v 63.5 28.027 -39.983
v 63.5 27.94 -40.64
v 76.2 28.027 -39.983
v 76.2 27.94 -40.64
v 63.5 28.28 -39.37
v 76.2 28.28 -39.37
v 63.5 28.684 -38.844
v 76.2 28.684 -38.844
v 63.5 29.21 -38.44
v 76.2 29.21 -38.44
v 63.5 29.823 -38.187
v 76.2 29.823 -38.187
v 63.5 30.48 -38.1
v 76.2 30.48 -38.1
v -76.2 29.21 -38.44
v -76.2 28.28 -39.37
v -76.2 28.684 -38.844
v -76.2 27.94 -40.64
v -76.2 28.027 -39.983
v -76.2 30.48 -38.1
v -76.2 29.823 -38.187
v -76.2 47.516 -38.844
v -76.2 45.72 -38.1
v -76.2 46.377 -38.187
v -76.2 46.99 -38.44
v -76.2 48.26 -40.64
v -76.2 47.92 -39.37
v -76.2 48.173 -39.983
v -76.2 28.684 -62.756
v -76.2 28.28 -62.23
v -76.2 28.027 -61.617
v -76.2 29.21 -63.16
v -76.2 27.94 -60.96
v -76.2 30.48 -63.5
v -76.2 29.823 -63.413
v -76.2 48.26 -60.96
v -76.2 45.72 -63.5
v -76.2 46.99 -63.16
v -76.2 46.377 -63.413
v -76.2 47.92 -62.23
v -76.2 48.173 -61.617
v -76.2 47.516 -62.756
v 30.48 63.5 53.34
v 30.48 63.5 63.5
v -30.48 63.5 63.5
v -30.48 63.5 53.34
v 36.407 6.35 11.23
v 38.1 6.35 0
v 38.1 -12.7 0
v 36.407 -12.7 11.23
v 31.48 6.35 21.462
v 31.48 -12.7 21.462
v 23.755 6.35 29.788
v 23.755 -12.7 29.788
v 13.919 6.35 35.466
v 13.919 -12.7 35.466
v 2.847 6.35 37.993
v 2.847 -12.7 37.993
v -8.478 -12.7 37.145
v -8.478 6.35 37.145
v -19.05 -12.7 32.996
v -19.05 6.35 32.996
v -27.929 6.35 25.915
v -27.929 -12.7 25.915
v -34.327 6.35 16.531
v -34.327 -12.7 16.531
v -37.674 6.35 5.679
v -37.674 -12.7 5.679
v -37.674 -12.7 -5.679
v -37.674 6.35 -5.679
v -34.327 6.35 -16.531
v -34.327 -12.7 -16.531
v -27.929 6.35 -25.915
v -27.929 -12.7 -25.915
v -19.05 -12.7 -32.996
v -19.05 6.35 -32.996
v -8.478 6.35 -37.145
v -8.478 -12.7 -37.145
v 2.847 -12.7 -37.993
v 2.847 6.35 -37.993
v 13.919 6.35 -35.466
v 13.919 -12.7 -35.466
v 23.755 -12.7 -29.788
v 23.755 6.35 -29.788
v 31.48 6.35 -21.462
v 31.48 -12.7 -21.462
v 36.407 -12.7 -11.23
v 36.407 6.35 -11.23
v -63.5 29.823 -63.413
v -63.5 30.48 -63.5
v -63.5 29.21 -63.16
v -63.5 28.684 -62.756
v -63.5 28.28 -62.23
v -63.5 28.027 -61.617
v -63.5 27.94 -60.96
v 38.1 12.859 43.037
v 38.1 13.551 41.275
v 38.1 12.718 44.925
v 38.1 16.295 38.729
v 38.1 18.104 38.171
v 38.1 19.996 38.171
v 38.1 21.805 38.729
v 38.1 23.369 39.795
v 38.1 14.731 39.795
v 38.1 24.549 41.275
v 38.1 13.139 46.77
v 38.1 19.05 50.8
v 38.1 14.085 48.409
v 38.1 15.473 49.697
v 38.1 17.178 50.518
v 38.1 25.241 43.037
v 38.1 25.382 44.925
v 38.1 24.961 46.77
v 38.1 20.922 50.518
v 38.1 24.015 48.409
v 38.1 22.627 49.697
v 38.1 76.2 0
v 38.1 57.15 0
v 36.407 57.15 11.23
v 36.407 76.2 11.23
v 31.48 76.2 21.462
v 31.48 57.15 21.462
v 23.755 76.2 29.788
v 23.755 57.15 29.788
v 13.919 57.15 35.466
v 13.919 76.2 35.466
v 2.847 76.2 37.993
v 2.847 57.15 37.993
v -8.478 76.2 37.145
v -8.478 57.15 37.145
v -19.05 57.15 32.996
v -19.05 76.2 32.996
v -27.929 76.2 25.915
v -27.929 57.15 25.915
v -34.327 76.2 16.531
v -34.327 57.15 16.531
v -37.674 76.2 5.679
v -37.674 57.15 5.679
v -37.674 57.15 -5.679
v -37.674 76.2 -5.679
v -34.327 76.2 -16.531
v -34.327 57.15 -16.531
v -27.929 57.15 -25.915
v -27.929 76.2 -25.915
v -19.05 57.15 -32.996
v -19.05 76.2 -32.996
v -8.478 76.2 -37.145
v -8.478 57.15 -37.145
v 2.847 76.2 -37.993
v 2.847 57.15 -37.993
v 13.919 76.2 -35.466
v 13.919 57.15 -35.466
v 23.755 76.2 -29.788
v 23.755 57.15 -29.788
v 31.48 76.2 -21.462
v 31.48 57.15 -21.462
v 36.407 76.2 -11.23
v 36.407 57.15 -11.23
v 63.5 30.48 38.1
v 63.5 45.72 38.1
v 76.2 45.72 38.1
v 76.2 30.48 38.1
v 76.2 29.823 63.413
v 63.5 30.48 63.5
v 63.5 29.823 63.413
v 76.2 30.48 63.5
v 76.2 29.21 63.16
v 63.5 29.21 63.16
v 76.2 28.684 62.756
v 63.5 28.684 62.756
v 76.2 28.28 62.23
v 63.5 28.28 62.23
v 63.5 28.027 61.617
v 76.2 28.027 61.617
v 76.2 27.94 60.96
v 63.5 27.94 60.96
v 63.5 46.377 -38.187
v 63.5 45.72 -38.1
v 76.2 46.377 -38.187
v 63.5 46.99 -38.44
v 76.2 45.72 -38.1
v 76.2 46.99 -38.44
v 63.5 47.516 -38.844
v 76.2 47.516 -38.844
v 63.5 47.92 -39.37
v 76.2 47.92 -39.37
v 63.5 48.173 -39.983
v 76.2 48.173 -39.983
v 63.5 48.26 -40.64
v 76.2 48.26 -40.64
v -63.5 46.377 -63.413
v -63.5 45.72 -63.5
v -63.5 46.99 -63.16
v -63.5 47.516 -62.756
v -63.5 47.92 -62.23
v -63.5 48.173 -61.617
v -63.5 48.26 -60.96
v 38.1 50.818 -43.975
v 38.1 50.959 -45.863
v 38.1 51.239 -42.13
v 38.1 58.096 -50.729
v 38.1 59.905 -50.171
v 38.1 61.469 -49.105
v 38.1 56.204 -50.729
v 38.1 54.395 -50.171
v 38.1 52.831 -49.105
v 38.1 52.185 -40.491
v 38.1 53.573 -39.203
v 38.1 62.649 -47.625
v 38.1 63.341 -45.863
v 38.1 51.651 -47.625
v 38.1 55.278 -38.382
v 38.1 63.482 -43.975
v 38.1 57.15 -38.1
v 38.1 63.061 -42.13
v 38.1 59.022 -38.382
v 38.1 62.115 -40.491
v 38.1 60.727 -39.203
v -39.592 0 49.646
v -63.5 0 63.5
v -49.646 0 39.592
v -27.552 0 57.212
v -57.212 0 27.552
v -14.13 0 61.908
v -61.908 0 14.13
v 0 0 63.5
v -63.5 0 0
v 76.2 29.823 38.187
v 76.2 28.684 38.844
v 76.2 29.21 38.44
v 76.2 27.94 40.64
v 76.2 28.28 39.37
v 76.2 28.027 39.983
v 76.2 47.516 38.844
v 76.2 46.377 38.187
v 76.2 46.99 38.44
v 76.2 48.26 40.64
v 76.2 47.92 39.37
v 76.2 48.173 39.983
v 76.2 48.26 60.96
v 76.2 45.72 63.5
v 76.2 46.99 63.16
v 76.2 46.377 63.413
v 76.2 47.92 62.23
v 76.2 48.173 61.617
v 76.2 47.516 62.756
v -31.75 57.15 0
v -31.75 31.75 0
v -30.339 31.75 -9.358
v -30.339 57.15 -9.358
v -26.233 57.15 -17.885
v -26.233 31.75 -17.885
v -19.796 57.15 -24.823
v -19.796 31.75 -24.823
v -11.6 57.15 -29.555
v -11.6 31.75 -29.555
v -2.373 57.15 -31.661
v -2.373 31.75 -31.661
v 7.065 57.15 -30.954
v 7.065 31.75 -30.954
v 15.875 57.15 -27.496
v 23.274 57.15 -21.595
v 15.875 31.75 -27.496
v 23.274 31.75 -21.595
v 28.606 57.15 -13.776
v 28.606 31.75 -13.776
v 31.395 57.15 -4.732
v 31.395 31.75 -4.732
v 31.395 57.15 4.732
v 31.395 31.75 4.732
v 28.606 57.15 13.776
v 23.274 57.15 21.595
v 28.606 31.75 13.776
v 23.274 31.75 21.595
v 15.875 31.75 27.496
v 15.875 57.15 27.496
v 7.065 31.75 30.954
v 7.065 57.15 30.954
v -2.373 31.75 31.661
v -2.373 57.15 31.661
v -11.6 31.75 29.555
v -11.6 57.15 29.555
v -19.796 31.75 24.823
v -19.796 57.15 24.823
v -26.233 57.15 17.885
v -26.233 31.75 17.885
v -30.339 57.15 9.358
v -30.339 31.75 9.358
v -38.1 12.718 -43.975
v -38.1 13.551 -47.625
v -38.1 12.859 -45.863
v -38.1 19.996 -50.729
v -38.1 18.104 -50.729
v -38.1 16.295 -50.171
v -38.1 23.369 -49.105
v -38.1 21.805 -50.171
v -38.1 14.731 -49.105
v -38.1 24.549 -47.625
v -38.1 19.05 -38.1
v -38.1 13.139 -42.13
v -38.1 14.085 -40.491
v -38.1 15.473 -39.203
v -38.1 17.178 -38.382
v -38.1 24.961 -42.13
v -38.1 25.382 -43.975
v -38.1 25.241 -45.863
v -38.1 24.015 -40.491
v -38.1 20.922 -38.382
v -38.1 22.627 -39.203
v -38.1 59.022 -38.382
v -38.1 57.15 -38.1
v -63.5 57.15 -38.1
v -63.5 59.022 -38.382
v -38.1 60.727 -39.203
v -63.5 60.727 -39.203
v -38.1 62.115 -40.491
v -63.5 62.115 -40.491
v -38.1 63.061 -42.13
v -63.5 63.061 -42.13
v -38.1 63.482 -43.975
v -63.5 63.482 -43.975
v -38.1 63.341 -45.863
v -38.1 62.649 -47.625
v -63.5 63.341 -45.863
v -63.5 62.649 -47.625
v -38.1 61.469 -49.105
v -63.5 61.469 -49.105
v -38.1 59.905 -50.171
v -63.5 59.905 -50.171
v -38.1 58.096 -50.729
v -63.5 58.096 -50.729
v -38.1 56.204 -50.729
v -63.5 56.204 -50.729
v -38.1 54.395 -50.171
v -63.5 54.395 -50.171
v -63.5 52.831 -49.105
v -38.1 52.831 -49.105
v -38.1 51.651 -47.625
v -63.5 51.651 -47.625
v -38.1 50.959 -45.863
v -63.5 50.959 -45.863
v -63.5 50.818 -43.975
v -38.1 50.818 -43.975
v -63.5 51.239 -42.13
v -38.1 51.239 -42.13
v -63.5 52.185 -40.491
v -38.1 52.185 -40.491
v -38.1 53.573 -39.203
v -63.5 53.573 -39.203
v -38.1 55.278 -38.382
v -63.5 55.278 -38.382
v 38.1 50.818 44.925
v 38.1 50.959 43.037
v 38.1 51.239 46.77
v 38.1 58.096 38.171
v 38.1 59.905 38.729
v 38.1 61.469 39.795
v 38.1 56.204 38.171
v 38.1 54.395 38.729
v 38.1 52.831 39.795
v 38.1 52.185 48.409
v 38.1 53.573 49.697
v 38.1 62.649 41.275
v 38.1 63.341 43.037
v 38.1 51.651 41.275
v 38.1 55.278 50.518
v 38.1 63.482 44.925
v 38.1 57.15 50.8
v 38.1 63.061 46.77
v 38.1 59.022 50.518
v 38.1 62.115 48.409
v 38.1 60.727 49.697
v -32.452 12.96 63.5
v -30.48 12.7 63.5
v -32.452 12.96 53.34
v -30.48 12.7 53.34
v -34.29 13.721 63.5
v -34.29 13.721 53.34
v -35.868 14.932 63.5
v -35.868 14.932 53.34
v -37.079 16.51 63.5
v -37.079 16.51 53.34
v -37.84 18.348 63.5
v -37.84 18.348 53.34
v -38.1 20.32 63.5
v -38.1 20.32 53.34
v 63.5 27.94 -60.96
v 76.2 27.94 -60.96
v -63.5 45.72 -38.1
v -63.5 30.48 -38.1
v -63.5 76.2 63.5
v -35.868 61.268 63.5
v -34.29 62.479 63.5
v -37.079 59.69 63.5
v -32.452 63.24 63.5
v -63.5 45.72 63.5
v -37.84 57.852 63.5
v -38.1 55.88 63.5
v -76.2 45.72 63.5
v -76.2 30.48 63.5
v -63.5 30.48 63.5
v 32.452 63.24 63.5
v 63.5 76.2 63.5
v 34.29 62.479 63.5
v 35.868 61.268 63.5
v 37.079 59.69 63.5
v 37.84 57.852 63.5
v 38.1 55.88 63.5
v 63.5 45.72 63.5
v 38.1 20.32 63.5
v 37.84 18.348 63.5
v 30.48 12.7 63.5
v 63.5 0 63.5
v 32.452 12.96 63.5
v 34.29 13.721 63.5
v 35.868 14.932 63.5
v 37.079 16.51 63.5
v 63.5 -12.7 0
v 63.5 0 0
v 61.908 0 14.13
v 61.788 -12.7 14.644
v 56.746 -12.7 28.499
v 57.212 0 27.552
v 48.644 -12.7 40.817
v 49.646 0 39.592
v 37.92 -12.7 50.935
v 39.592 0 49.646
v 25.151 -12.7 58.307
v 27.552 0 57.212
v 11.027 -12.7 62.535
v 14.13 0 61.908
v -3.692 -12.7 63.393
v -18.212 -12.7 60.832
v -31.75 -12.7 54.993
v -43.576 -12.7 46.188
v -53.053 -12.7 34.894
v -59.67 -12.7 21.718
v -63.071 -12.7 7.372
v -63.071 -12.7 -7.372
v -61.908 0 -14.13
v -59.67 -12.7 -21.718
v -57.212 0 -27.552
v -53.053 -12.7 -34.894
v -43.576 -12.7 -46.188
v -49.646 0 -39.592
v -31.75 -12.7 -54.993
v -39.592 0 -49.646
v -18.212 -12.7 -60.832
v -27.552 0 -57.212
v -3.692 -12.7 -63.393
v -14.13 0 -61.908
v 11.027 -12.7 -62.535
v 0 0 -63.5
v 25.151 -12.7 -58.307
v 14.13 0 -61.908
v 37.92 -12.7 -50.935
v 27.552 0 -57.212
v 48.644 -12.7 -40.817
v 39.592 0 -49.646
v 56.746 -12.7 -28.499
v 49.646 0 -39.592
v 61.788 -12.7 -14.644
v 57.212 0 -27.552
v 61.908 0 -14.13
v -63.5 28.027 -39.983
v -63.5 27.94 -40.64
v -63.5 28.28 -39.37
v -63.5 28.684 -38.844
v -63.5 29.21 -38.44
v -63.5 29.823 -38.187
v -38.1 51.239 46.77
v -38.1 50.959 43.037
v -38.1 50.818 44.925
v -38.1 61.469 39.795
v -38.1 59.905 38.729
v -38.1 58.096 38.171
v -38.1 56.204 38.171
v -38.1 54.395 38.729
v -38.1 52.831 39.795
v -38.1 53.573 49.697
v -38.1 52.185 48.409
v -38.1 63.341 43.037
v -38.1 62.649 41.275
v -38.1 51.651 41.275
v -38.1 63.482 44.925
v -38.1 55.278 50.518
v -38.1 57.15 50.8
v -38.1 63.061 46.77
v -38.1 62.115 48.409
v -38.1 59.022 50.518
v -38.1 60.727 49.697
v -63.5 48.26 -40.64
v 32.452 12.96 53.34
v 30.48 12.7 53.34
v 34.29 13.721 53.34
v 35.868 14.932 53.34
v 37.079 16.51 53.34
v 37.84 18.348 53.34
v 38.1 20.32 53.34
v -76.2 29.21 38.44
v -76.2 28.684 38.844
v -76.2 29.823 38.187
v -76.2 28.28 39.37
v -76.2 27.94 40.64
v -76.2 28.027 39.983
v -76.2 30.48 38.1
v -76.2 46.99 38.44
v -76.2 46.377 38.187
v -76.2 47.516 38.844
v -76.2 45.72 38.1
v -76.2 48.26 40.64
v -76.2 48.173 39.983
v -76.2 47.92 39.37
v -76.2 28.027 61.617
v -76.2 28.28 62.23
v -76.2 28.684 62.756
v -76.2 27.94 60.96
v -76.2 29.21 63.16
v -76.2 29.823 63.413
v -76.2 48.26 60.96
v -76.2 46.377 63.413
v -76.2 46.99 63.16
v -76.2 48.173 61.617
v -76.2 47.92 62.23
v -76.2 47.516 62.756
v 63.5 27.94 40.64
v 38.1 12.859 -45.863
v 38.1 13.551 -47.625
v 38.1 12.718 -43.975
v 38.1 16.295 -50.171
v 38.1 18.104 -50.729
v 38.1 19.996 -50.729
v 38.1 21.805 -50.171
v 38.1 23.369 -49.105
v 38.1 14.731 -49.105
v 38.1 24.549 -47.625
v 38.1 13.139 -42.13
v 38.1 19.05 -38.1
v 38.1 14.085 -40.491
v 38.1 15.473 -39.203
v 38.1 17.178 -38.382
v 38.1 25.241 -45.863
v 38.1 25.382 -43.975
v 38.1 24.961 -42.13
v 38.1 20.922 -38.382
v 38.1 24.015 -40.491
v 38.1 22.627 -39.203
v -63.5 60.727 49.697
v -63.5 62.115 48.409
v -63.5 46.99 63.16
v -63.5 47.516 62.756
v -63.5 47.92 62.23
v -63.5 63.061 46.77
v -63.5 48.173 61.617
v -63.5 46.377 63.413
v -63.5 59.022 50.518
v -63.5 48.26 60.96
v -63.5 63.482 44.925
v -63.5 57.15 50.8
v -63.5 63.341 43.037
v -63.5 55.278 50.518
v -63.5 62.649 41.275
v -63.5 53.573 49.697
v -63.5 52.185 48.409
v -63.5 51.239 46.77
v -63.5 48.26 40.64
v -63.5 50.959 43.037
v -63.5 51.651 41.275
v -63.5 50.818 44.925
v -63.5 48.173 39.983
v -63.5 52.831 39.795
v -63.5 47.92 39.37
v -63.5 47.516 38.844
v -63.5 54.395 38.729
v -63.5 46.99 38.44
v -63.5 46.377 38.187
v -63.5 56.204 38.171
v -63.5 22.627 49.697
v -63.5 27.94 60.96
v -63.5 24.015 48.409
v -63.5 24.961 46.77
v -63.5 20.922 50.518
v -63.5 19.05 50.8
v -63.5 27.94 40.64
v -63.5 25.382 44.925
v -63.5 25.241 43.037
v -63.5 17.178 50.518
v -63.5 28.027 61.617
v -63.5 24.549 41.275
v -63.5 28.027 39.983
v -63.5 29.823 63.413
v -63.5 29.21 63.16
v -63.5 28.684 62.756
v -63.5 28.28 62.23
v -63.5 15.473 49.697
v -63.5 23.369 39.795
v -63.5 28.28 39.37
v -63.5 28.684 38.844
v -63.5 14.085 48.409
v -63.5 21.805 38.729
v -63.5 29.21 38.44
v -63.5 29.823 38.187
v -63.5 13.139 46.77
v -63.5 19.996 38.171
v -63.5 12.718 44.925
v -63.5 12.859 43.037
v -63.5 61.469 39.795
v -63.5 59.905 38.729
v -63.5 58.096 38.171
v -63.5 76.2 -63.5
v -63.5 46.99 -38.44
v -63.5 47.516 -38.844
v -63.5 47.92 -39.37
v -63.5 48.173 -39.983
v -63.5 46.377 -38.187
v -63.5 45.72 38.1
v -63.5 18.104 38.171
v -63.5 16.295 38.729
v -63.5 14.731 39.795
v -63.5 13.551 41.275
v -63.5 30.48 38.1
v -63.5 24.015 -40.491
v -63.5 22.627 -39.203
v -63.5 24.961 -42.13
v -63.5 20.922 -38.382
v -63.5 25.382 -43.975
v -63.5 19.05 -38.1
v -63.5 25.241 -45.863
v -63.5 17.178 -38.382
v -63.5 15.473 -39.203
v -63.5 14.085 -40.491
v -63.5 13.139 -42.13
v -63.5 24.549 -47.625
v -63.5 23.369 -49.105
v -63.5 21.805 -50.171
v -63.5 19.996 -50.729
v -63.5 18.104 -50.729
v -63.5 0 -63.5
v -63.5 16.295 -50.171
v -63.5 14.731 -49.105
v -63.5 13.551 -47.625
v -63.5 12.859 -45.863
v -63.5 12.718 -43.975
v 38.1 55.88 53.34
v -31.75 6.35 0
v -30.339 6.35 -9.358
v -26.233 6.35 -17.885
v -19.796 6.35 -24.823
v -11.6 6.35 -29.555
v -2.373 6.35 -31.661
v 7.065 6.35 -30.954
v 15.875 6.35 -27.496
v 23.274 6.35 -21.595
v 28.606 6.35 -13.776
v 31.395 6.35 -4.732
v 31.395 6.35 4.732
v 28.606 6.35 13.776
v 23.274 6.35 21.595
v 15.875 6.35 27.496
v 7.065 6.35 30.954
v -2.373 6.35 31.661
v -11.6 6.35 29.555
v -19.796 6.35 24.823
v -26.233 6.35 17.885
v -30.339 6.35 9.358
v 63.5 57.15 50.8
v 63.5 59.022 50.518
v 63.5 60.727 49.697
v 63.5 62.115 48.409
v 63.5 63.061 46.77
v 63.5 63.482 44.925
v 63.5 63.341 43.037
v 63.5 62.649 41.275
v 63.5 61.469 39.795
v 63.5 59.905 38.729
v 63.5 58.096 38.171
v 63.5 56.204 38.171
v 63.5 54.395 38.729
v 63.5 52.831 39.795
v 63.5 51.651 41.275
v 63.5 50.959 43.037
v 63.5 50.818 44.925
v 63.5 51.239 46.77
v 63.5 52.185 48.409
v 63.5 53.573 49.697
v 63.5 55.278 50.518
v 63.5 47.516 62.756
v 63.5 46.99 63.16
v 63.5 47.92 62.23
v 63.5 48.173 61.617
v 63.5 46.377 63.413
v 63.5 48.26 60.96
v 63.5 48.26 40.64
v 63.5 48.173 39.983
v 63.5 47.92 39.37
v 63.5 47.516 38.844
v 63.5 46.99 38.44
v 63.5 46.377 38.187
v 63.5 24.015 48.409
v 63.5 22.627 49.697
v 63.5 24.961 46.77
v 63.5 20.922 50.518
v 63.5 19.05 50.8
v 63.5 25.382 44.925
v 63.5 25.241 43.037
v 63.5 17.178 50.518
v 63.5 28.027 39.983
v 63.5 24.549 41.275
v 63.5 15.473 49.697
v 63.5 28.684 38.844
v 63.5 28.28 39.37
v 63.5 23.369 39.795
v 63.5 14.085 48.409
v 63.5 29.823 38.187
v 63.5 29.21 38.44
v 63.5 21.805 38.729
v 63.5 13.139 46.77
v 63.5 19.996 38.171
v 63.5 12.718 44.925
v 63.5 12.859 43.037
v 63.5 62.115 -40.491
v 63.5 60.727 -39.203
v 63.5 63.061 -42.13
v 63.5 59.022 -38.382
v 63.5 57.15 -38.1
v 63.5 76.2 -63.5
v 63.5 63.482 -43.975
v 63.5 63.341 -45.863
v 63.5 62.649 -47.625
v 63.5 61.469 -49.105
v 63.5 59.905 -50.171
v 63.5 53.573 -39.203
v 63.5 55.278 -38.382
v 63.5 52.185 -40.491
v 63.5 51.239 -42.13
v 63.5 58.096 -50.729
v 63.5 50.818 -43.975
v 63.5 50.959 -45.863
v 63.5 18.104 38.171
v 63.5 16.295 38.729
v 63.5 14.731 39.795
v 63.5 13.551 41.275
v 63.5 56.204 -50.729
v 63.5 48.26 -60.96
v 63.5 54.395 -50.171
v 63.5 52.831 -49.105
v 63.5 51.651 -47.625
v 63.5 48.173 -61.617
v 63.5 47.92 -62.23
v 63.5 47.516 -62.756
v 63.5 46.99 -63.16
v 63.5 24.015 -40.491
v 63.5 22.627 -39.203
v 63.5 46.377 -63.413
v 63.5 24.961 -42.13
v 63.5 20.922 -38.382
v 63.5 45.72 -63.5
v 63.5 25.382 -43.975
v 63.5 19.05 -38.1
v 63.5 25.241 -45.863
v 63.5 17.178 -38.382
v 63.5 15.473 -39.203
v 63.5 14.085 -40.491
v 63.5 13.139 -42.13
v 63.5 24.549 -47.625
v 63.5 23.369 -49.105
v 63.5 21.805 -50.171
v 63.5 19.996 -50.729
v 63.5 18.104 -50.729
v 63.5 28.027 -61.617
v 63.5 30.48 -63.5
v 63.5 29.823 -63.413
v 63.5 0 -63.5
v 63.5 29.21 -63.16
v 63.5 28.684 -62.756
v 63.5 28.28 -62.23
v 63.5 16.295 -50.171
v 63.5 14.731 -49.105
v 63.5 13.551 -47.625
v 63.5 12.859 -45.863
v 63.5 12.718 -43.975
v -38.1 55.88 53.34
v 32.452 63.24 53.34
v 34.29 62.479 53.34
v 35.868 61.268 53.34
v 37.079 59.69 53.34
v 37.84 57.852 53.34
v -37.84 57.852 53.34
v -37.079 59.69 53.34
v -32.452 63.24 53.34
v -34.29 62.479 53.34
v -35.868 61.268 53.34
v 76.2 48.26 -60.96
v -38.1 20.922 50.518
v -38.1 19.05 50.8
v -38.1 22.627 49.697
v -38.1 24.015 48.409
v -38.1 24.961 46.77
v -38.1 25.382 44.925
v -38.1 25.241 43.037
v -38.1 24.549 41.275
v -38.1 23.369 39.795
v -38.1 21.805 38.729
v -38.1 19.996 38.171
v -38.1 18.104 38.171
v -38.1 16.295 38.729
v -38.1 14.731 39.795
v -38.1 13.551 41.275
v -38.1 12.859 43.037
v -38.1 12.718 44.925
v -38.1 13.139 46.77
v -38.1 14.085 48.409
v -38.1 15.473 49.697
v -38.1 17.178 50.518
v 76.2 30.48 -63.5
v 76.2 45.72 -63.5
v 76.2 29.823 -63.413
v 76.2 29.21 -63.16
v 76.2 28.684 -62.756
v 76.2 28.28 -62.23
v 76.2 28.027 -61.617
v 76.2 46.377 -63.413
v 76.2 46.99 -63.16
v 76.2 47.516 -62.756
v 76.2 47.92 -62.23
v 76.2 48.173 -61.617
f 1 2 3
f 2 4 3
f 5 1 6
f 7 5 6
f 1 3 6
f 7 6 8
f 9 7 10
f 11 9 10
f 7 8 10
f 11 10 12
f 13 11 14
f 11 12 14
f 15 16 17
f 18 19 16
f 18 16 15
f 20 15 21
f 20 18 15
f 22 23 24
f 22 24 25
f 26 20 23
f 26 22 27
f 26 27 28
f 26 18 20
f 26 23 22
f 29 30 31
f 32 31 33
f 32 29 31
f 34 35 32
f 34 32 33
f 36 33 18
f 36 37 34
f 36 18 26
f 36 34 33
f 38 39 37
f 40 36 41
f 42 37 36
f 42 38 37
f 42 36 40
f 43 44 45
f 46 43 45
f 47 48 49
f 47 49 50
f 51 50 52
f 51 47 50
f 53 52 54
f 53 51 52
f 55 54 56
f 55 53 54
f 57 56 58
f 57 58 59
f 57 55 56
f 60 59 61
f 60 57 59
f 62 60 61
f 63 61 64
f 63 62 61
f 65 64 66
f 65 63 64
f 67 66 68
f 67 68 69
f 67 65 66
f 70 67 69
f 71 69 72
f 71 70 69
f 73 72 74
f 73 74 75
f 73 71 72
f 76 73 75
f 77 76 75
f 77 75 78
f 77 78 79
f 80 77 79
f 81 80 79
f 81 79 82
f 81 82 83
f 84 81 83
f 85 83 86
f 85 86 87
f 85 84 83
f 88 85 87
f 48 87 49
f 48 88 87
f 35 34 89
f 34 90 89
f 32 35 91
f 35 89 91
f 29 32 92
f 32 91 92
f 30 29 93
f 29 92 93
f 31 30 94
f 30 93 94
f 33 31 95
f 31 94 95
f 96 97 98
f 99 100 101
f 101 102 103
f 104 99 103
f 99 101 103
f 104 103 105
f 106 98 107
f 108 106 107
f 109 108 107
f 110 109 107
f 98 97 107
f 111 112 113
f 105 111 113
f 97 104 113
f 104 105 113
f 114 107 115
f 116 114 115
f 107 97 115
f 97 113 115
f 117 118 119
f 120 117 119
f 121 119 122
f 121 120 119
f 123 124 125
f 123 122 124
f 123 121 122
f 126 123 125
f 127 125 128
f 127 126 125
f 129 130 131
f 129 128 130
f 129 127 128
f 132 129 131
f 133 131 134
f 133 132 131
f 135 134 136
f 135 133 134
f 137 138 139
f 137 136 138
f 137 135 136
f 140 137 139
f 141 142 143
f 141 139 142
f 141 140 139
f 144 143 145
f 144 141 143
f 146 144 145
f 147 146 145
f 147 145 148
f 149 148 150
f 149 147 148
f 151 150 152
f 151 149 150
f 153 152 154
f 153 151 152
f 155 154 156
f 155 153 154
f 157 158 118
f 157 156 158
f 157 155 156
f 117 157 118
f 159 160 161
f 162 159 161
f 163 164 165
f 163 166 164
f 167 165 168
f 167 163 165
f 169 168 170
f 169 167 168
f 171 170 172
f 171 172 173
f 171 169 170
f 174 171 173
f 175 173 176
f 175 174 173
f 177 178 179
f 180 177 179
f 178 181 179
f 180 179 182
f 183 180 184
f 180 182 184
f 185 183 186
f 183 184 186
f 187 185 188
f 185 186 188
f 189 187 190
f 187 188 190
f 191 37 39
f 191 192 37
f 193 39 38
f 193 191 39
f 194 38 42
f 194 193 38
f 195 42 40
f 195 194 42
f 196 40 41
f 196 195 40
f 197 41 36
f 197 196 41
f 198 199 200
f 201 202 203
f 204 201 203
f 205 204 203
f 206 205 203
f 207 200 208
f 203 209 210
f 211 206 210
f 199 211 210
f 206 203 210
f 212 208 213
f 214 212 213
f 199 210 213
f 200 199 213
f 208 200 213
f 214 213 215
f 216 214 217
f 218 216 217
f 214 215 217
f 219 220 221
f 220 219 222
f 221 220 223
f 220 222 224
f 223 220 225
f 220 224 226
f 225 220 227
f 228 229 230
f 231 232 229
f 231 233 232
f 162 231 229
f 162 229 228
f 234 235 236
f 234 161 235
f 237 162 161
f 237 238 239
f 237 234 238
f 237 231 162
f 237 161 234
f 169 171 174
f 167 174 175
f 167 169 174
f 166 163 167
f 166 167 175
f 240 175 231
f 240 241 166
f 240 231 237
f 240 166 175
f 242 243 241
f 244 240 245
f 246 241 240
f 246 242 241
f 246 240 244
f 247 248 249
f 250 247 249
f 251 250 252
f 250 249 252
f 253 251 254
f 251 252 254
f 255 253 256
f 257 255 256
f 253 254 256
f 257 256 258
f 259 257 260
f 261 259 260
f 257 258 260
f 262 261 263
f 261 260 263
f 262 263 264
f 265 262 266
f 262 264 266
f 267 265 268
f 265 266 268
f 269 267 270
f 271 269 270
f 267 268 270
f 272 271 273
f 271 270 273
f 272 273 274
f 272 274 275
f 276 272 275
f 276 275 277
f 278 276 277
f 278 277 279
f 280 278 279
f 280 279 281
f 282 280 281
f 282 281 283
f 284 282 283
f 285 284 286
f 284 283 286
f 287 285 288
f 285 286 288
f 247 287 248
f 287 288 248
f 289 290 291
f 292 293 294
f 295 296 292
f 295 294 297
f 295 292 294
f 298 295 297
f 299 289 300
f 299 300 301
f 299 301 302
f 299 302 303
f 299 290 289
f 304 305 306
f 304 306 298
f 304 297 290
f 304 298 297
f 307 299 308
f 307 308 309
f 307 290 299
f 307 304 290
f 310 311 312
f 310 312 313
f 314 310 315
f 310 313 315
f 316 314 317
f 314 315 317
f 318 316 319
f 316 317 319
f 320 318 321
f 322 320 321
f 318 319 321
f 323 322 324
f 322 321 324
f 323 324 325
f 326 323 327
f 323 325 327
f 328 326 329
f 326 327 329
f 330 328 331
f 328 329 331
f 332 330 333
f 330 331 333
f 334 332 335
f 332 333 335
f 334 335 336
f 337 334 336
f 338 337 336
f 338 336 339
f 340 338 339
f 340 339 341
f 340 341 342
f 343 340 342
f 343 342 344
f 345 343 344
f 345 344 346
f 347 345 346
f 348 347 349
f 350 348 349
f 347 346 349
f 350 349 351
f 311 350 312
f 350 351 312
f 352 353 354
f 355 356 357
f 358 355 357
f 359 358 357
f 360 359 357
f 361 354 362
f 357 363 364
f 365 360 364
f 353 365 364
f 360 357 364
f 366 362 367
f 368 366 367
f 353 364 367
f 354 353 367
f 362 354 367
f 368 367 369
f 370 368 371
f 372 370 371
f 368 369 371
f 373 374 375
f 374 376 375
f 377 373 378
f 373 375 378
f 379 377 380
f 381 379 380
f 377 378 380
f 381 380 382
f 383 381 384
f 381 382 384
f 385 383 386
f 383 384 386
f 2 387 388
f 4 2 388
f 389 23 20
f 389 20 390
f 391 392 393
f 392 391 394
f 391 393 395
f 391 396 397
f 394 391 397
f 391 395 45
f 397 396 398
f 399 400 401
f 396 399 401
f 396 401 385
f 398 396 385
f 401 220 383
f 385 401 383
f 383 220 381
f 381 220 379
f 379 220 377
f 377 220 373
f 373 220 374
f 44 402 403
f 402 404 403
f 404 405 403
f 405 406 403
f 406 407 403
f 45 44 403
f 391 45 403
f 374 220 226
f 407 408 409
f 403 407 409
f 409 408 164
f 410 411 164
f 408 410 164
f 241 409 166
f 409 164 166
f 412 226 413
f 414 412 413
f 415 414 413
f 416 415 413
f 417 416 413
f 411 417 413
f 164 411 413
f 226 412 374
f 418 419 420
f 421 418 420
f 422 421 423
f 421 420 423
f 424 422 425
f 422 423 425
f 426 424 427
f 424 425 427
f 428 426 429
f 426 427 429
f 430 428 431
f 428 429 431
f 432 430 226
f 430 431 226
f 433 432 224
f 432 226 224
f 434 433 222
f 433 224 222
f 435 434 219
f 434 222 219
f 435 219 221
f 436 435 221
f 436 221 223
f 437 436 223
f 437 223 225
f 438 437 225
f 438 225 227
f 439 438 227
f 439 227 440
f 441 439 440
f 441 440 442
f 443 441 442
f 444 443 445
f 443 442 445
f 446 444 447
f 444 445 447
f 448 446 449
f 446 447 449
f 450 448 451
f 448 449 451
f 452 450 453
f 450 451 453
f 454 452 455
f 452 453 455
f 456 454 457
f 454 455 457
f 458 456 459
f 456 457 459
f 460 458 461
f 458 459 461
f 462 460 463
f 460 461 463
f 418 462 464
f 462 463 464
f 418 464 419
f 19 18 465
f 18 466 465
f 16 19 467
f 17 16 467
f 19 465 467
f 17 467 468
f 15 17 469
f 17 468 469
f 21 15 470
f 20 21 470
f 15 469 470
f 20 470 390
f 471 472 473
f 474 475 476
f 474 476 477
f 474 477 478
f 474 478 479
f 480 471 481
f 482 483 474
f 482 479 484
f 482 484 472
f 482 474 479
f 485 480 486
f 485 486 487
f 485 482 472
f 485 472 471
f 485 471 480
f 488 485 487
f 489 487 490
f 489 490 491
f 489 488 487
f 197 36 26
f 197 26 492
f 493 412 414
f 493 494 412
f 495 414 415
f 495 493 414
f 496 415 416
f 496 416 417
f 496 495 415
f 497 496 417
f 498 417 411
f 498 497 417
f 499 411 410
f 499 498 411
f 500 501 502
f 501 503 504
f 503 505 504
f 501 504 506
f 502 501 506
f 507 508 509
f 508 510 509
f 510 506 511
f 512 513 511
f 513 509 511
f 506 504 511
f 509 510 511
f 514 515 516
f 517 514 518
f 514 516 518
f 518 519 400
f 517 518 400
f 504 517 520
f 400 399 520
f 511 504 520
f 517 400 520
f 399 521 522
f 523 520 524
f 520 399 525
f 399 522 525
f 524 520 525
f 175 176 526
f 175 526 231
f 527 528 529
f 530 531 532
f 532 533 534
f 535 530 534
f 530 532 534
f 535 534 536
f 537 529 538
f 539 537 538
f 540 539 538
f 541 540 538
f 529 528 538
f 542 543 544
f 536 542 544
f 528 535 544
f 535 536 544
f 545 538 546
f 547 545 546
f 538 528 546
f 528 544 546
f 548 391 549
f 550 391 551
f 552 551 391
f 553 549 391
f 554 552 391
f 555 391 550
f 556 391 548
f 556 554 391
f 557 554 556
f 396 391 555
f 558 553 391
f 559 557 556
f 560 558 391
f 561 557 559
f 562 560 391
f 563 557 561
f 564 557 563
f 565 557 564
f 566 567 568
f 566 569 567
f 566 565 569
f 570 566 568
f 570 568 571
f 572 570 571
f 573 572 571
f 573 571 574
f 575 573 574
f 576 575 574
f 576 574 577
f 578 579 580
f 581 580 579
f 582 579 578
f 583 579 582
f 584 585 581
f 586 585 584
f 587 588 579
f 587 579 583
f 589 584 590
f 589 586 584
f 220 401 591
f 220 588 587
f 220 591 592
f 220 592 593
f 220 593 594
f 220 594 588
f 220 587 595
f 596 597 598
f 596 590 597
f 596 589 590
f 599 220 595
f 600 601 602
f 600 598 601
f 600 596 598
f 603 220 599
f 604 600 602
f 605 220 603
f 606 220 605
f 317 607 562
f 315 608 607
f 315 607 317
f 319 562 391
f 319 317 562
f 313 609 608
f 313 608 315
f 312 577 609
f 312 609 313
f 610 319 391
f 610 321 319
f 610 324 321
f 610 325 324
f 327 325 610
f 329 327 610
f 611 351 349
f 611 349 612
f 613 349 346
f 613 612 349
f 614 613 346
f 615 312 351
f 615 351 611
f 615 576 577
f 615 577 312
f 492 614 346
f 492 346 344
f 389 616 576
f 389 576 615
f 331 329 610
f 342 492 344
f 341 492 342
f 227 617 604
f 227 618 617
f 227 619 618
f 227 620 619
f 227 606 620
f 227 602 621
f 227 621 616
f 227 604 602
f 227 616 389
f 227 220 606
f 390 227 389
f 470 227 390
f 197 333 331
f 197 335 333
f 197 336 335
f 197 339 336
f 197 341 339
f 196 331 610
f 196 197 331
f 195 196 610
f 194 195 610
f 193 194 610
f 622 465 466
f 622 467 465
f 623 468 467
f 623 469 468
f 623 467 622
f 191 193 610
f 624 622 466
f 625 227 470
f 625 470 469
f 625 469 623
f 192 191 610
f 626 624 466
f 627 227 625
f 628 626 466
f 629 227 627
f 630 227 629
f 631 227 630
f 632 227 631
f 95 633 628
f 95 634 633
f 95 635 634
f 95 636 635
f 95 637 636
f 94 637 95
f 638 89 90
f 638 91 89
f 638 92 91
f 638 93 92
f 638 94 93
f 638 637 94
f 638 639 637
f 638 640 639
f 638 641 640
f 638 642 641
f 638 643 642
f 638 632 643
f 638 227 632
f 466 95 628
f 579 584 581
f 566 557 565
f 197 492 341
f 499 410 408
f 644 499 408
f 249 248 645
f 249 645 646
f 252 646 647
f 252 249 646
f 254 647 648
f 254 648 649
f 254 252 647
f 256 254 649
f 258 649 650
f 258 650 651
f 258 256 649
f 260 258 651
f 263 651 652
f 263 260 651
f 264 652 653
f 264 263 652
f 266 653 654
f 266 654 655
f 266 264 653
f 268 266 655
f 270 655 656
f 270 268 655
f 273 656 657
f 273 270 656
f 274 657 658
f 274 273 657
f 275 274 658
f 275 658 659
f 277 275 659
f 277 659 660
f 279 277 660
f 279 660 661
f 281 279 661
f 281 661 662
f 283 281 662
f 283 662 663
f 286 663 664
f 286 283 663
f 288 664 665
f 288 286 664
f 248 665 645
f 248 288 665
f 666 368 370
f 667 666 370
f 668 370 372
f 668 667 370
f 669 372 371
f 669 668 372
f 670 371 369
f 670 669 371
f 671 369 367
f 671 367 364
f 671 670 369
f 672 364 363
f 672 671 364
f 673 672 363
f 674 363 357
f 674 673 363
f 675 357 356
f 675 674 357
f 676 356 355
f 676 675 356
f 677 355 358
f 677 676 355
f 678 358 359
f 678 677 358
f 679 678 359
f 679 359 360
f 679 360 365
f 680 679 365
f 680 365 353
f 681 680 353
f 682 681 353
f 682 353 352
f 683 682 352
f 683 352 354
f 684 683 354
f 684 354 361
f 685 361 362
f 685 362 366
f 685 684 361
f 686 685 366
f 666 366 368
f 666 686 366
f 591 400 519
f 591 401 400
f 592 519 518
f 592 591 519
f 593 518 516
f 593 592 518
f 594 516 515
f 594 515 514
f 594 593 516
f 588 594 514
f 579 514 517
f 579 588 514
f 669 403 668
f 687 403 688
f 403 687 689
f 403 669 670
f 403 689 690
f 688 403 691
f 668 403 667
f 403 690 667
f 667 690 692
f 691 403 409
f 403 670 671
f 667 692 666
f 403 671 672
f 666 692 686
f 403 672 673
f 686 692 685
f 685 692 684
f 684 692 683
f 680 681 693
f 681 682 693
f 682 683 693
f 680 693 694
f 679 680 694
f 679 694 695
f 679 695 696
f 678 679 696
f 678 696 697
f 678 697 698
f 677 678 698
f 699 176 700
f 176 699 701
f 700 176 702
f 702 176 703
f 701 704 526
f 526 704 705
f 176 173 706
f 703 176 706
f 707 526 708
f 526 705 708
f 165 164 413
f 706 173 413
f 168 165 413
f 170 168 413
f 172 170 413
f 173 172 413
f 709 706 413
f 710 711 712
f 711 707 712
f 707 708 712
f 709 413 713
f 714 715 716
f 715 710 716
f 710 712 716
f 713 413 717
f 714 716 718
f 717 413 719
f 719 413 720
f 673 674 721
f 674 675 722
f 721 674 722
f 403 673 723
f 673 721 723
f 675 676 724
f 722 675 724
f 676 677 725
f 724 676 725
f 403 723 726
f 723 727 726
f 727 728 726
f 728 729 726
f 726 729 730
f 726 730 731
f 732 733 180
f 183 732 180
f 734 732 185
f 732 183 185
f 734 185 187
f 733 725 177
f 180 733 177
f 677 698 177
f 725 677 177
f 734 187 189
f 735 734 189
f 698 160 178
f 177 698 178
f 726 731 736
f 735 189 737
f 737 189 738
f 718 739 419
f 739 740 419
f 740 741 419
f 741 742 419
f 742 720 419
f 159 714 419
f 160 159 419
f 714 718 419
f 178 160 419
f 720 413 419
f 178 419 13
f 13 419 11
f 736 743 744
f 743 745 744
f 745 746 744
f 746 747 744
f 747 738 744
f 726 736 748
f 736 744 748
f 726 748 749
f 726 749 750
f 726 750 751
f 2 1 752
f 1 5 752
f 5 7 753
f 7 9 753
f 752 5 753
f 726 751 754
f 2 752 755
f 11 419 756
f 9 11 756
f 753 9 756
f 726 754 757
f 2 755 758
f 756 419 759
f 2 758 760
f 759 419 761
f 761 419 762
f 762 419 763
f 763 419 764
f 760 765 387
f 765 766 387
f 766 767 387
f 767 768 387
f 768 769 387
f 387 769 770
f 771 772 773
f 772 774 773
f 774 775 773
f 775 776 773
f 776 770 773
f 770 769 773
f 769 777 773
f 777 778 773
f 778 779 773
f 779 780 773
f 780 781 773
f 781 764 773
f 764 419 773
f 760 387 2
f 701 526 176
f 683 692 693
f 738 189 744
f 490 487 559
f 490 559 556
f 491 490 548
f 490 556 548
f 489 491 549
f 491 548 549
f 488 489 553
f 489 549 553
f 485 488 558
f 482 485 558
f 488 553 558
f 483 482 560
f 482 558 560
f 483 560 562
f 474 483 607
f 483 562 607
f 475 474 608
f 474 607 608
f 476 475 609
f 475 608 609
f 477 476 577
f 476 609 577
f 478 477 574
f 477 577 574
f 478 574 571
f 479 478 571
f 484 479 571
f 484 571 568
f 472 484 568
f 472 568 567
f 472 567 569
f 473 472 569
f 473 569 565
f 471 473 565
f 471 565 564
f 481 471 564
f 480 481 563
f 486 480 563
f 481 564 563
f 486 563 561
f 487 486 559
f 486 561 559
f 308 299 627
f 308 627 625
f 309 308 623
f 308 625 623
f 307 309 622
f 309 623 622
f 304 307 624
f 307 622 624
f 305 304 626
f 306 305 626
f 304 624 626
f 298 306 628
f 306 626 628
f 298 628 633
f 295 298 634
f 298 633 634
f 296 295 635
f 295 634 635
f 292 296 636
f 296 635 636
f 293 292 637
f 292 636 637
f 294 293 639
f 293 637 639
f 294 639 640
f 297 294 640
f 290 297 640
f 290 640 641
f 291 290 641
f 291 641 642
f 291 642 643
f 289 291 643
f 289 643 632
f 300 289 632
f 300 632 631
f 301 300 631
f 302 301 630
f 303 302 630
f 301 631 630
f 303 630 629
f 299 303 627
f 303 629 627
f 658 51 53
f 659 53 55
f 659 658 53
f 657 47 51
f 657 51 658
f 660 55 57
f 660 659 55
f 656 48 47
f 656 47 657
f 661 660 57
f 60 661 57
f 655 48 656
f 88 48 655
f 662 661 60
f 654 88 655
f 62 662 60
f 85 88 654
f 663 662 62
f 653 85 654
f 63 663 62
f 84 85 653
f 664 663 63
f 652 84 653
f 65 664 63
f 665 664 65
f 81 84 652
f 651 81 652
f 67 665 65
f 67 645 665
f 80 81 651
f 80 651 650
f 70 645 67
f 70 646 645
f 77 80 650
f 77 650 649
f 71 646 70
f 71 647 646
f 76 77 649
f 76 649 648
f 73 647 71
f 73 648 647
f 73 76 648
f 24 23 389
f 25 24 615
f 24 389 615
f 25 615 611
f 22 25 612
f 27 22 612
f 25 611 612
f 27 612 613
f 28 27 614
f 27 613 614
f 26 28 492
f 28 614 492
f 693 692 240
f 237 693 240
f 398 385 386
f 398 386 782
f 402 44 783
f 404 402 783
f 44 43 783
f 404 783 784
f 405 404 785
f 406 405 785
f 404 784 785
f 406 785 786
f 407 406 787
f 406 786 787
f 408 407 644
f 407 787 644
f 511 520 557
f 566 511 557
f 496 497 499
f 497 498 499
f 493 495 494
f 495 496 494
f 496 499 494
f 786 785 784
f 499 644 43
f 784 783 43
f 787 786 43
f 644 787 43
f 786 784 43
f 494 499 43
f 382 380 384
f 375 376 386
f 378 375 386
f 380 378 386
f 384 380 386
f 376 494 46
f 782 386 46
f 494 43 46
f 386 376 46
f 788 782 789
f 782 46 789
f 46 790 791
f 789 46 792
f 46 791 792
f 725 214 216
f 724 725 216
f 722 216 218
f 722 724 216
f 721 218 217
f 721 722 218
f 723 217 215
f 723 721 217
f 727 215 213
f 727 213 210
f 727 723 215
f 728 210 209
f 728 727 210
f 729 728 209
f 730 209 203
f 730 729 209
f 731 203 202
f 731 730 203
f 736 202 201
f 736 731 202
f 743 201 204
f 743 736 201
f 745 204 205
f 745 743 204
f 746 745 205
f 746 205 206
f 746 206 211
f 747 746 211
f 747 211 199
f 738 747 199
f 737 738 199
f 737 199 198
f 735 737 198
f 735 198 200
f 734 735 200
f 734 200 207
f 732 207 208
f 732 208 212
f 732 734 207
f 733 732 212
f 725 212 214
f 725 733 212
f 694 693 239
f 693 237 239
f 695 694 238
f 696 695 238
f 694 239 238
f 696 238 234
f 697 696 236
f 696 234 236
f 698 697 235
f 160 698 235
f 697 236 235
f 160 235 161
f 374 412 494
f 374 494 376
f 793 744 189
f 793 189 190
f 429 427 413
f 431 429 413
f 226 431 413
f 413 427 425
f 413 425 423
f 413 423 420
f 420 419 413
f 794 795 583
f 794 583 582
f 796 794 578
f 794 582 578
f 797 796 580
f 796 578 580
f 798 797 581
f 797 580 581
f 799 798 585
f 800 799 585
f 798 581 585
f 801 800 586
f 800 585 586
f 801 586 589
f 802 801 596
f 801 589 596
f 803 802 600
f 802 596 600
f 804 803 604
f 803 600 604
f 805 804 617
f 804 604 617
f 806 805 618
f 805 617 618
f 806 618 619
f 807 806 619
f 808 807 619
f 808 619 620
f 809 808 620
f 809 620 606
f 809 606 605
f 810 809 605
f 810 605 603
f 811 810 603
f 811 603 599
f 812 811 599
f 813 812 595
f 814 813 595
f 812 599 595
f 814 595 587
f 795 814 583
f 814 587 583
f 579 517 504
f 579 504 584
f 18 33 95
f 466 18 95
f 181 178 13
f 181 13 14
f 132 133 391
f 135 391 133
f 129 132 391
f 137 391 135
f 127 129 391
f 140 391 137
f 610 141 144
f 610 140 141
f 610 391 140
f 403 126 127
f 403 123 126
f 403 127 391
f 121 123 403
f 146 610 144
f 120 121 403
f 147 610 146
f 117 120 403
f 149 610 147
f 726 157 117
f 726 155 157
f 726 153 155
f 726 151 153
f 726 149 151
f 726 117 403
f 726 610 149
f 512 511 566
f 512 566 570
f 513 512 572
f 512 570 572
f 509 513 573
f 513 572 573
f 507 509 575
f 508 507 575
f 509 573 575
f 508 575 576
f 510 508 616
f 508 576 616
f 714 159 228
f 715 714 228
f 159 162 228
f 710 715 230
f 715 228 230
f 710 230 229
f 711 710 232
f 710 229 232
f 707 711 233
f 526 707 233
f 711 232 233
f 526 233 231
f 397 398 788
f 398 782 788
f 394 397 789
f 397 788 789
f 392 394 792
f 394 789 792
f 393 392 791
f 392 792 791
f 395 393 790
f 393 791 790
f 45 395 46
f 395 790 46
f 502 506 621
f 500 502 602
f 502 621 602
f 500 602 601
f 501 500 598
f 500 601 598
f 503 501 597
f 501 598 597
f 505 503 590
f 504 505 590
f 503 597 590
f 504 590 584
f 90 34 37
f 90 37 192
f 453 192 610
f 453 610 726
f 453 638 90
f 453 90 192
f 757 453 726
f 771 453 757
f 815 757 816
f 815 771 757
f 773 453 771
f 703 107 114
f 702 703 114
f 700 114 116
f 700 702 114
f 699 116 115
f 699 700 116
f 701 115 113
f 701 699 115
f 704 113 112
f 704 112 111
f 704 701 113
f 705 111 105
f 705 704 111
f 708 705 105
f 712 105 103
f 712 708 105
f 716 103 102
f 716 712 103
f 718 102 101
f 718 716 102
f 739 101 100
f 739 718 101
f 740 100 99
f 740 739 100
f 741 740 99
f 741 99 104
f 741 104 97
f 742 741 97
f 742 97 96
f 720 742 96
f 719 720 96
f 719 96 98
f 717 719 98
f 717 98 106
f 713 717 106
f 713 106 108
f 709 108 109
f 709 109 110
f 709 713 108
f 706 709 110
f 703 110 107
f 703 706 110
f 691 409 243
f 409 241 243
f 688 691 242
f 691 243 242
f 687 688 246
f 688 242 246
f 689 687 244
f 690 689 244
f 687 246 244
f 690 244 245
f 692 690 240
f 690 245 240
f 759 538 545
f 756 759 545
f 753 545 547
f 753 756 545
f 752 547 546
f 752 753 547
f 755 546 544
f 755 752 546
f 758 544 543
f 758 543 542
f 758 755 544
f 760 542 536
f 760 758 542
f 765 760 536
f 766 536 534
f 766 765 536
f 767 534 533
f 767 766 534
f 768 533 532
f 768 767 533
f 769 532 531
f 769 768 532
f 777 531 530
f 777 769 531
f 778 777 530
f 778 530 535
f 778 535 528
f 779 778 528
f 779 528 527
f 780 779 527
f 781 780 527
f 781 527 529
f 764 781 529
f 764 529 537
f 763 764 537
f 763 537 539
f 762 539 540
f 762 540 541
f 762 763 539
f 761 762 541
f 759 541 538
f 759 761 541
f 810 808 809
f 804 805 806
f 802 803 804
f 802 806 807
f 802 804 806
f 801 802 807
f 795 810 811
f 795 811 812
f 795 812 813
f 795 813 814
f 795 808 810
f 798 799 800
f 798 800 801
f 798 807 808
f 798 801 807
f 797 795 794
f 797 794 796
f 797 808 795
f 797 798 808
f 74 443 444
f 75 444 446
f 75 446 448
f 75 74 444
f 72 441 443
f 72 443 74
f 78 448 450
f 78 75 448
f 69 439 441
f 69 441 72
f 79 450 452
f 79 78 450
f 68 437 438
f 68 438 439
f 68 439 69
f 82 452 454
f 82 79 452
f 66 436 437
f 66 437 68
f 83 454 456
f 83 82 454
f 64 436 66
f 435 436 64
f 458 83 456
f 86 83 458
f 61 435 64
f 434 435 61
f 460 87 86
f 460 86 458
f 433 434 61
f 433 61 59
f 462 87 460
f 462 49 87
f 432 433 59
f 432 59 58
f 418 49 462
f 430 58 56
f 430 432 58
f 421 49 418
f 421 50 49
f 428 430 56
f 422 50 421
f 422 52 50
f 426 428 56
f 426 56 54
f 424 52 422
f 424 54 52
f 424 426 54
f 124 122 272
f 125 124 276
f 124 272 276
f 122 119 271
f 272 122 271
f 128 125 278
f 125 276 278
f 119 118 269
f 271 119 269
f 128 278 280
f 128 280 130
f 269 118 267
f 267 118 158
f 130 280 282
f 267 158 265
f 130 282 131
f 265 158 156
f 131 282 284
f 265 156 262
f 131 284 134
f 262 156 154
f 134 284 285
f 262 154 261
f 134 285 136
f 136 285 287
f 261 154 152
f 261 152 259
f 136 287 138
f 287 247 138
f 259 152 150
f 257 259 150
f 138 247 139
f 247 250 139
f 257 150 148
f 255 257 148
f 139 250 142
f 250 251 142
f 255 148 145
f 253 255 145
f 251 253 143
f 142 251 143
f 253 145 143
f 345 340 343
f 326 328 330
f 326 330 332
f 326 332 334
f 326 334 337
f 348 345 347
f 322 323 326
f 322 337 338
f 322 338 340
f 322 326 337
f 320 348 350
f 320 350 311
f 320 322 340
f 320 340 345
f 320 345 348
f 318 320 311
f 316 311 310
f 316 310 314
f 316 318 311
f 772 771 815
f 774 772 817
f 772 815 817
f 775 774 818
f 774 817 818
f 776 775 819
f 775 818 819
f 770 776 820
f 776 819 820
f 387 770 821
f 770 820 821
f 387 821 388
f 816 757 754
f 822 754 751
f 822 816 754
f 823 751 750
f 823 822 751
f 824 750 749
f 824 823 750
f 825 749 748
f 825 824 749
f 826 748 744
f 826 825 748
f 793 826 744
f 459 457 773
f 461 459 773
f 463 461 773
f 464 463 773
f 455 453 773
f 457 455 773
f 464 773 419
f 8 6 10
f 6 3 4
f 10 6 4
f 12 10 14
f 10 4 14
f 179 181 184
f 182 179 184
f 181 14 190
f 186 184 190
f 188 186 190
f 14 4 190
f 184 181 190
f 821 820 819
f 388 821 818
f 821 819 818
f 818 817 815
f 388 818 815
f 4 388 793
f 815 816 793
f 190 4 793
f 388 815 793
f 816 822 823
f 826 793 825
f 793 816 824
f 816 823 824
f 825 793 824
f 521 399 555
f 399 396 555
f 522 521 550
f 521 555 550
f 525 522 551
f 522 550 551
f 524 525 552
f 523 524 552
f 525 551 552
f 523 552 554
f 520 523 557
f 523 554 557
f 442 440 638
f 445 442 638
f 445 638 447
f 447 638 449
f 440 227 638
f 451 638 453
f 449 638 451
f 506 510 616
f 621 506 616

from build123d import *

# Parameters (mm, degrees)
SKETCH1_W                = 127
SKETCH1_H                = 127
SKETCH1_R                = 38.1
BOSS_EXTRUDE1_DEPTH      = 76.2
SKETCH2_R                = 6.35
CUT_EXTRUDE1_DEPTH       = 25.4
SKETCH3_R                = 63.5
SKETCH3_R_2              = 38.1
BOSS_EXTRUDE2_DEPTH      = 12.7
SKETCH4_W                = 12.7
SKETCH4_H                = 20.32
BOSS_EXTRUDE3_DEPTH      = 25.4
FILLET1_R                = 2.54
FILLET1_OF_MIRROR2_R     = 2.54
SKETCH5_W                = 76.2
SKETCH5_H                = 50.8
CUT_EXTRUDE3_DEPTH       = 10.16
FILLET2_R                = 7.62
SKETCH6_R                = 38.1
SKETCH6_R_2              = 31.75
BOSS_EXTRUDE4_DEPTH      = 25.4
BOSS_EXTRUDE4_DEPTH_BACK = 25.4


with BuildPart() as part:
    # Sketch1 → Boss-Extrude1 (new body)
    with BuildSketch(Plane(origin=(0, 0, 0), x_dir=(1, 0, 0), z_dir=(0, 1, 0))):
        Rectangle(SKETCH1_W, SKETCH1_H)
        Circle(SKETCH1_R, mode=Mode.SUBTRACT)
    extrude(amount=BOSS_EXTRUDE1_DEPTH)

    # Sketch2 → Cut-Extrude1 (cut)
    with BuildSketch(Plane.ZY.offset(63.5)):
        with Locations((-44.45, 57.15)):
            Circle(SKETCH2_R)
        with Locations((-44.45, 19.05)):
            Circle(SKETCH2_R)
        with Locations((44.45, 57.15)):
            Circle(SKETCH2_R)
        with Locations((44.45, 19.05)):
            Circle(SKETCH2_R)
    cut_extrude1 = extrude(amount=-CUT_EXTRUDE1_DEPTH, mode=Mode.SUBTRACT)

    # Mirror1: Cut-Extrude1 across plane
    add(cut_extrude1.mirror(Plane(origin=(0, 0, 0), x_dir=(0, 0, 1), z_dir=(1, 0, 0))), mode=Mode.SUBTRACT)

    # Sketch3 → Boss-Extrude2 (add)
    with BuildSketch(Plane.XZ):
        Circle(SKETCH3_R)
        Circle(SKETCH3_R_2, mode=Mode.SUBTRACT)
    extrude(amount=BOSS_EXTRUDE2_DEPTH)

    # Sketch4 → Boss-Extrude3 (add)
    with BuildSketch(Plane.XY.offset(63.5)):
        with Locations((-69.85, 38.1)):
            Rectangle(SKETCH4_W, SKETCH4_H)
        with Locations((69.85, 38.1)):
            Rectangle(SKETCH4_W, SKETCH4_H)
    boss_extrude3 = extrude(amount=-BOSS_EXTRUDE3_DEPTH)

    # Fillet1
    fillet1_edges = [part.edges().sort_by_distance(p)[0] for p in [
        (-69.85, 27.94, 38.1),
        (-69.85, 48.26, 38.1),
        (-69.85, 48.26, 63.5),
        (-69.85, 27.94, 63.5),
        (69.85, 48.26, 38.1),
        (69.85, 27.94, 38.1),
        (69.85, 27.94, 63.5),
        (69.85, 48.26, 63.5),
    ]]
    fillet(fillet1_edges, radius=FILLET1_R)

    # Mirror2: Boss-Extrude3 across plane
    add(boss_extrude3.mirror(Plane.XY))

    # Fillet1 of Mirror2
    fillet1_of_mirror2_edges = [part.edges().sort_by_distance(p)[0] for p in [
        (-69.85, 27.94, -38.1),
        (-69.85, 48.26, -38.1),
        (-69.85, 48.26, -63.5),
        (-69.85, 27.94, -63.5),
        (69.85, 48.26, -38.1),
        (69.85, 27.94, -38.1),
        (69.85, 27.94, -63.5),
        (69.85, 48.26, -63.5),
    ]]
    fillet(fillet1_of_mirror2_edges, radius=FILLET1_OF_MIRROR2_R)

    # Sketch5 → Cut-Extrude3 (cut)
    with BuildSketch(Plane(origin=(0, 0, 63.5), x_dir=(-1, 0, 0), z_dir=(0, 0, -1))):
        with Locations((0, 38.1)):
            Rectangle(SKETCH5_W, SKETCH5_H)
    extrude(amount=CUT_EXTRUDE3_DEPTH, mode=Mode.SUBTRACT)

    # Fillet2
    fillet2_edges = [part.edges().sort_by_distance(p)[0] for p in [
        (38.1, 63.5, 58.42),
        (38.1, 12.7, 58.42),
        (-38.1, 12.7, 58.42),
        (-38.1, 63.5, 58.42),
    ]]
    fillet(fillet2_edges, radius=FILLET2_R)

    # Sketch6 → Boss-Extrude4 (add, two sides)
    with BuildSketch(Plane(origin=(0, 31.75, 0), x_dir=(-1, 0, 0), z_dir=(0, -1, 0))) as boss_extrude4_sk:
        Circle(SKETCH6_R)
        Circle(SKETCH6_R_2, mode=Mode.SUBTRACT)
    extrude(amount=BOSS_EXTRUDE4_DEPTH)
    extrude(boss_extrude4_sk.sketch, amount=-BOSS_EXTRUDE4_DEPTH_BACK)


solid = part.part
